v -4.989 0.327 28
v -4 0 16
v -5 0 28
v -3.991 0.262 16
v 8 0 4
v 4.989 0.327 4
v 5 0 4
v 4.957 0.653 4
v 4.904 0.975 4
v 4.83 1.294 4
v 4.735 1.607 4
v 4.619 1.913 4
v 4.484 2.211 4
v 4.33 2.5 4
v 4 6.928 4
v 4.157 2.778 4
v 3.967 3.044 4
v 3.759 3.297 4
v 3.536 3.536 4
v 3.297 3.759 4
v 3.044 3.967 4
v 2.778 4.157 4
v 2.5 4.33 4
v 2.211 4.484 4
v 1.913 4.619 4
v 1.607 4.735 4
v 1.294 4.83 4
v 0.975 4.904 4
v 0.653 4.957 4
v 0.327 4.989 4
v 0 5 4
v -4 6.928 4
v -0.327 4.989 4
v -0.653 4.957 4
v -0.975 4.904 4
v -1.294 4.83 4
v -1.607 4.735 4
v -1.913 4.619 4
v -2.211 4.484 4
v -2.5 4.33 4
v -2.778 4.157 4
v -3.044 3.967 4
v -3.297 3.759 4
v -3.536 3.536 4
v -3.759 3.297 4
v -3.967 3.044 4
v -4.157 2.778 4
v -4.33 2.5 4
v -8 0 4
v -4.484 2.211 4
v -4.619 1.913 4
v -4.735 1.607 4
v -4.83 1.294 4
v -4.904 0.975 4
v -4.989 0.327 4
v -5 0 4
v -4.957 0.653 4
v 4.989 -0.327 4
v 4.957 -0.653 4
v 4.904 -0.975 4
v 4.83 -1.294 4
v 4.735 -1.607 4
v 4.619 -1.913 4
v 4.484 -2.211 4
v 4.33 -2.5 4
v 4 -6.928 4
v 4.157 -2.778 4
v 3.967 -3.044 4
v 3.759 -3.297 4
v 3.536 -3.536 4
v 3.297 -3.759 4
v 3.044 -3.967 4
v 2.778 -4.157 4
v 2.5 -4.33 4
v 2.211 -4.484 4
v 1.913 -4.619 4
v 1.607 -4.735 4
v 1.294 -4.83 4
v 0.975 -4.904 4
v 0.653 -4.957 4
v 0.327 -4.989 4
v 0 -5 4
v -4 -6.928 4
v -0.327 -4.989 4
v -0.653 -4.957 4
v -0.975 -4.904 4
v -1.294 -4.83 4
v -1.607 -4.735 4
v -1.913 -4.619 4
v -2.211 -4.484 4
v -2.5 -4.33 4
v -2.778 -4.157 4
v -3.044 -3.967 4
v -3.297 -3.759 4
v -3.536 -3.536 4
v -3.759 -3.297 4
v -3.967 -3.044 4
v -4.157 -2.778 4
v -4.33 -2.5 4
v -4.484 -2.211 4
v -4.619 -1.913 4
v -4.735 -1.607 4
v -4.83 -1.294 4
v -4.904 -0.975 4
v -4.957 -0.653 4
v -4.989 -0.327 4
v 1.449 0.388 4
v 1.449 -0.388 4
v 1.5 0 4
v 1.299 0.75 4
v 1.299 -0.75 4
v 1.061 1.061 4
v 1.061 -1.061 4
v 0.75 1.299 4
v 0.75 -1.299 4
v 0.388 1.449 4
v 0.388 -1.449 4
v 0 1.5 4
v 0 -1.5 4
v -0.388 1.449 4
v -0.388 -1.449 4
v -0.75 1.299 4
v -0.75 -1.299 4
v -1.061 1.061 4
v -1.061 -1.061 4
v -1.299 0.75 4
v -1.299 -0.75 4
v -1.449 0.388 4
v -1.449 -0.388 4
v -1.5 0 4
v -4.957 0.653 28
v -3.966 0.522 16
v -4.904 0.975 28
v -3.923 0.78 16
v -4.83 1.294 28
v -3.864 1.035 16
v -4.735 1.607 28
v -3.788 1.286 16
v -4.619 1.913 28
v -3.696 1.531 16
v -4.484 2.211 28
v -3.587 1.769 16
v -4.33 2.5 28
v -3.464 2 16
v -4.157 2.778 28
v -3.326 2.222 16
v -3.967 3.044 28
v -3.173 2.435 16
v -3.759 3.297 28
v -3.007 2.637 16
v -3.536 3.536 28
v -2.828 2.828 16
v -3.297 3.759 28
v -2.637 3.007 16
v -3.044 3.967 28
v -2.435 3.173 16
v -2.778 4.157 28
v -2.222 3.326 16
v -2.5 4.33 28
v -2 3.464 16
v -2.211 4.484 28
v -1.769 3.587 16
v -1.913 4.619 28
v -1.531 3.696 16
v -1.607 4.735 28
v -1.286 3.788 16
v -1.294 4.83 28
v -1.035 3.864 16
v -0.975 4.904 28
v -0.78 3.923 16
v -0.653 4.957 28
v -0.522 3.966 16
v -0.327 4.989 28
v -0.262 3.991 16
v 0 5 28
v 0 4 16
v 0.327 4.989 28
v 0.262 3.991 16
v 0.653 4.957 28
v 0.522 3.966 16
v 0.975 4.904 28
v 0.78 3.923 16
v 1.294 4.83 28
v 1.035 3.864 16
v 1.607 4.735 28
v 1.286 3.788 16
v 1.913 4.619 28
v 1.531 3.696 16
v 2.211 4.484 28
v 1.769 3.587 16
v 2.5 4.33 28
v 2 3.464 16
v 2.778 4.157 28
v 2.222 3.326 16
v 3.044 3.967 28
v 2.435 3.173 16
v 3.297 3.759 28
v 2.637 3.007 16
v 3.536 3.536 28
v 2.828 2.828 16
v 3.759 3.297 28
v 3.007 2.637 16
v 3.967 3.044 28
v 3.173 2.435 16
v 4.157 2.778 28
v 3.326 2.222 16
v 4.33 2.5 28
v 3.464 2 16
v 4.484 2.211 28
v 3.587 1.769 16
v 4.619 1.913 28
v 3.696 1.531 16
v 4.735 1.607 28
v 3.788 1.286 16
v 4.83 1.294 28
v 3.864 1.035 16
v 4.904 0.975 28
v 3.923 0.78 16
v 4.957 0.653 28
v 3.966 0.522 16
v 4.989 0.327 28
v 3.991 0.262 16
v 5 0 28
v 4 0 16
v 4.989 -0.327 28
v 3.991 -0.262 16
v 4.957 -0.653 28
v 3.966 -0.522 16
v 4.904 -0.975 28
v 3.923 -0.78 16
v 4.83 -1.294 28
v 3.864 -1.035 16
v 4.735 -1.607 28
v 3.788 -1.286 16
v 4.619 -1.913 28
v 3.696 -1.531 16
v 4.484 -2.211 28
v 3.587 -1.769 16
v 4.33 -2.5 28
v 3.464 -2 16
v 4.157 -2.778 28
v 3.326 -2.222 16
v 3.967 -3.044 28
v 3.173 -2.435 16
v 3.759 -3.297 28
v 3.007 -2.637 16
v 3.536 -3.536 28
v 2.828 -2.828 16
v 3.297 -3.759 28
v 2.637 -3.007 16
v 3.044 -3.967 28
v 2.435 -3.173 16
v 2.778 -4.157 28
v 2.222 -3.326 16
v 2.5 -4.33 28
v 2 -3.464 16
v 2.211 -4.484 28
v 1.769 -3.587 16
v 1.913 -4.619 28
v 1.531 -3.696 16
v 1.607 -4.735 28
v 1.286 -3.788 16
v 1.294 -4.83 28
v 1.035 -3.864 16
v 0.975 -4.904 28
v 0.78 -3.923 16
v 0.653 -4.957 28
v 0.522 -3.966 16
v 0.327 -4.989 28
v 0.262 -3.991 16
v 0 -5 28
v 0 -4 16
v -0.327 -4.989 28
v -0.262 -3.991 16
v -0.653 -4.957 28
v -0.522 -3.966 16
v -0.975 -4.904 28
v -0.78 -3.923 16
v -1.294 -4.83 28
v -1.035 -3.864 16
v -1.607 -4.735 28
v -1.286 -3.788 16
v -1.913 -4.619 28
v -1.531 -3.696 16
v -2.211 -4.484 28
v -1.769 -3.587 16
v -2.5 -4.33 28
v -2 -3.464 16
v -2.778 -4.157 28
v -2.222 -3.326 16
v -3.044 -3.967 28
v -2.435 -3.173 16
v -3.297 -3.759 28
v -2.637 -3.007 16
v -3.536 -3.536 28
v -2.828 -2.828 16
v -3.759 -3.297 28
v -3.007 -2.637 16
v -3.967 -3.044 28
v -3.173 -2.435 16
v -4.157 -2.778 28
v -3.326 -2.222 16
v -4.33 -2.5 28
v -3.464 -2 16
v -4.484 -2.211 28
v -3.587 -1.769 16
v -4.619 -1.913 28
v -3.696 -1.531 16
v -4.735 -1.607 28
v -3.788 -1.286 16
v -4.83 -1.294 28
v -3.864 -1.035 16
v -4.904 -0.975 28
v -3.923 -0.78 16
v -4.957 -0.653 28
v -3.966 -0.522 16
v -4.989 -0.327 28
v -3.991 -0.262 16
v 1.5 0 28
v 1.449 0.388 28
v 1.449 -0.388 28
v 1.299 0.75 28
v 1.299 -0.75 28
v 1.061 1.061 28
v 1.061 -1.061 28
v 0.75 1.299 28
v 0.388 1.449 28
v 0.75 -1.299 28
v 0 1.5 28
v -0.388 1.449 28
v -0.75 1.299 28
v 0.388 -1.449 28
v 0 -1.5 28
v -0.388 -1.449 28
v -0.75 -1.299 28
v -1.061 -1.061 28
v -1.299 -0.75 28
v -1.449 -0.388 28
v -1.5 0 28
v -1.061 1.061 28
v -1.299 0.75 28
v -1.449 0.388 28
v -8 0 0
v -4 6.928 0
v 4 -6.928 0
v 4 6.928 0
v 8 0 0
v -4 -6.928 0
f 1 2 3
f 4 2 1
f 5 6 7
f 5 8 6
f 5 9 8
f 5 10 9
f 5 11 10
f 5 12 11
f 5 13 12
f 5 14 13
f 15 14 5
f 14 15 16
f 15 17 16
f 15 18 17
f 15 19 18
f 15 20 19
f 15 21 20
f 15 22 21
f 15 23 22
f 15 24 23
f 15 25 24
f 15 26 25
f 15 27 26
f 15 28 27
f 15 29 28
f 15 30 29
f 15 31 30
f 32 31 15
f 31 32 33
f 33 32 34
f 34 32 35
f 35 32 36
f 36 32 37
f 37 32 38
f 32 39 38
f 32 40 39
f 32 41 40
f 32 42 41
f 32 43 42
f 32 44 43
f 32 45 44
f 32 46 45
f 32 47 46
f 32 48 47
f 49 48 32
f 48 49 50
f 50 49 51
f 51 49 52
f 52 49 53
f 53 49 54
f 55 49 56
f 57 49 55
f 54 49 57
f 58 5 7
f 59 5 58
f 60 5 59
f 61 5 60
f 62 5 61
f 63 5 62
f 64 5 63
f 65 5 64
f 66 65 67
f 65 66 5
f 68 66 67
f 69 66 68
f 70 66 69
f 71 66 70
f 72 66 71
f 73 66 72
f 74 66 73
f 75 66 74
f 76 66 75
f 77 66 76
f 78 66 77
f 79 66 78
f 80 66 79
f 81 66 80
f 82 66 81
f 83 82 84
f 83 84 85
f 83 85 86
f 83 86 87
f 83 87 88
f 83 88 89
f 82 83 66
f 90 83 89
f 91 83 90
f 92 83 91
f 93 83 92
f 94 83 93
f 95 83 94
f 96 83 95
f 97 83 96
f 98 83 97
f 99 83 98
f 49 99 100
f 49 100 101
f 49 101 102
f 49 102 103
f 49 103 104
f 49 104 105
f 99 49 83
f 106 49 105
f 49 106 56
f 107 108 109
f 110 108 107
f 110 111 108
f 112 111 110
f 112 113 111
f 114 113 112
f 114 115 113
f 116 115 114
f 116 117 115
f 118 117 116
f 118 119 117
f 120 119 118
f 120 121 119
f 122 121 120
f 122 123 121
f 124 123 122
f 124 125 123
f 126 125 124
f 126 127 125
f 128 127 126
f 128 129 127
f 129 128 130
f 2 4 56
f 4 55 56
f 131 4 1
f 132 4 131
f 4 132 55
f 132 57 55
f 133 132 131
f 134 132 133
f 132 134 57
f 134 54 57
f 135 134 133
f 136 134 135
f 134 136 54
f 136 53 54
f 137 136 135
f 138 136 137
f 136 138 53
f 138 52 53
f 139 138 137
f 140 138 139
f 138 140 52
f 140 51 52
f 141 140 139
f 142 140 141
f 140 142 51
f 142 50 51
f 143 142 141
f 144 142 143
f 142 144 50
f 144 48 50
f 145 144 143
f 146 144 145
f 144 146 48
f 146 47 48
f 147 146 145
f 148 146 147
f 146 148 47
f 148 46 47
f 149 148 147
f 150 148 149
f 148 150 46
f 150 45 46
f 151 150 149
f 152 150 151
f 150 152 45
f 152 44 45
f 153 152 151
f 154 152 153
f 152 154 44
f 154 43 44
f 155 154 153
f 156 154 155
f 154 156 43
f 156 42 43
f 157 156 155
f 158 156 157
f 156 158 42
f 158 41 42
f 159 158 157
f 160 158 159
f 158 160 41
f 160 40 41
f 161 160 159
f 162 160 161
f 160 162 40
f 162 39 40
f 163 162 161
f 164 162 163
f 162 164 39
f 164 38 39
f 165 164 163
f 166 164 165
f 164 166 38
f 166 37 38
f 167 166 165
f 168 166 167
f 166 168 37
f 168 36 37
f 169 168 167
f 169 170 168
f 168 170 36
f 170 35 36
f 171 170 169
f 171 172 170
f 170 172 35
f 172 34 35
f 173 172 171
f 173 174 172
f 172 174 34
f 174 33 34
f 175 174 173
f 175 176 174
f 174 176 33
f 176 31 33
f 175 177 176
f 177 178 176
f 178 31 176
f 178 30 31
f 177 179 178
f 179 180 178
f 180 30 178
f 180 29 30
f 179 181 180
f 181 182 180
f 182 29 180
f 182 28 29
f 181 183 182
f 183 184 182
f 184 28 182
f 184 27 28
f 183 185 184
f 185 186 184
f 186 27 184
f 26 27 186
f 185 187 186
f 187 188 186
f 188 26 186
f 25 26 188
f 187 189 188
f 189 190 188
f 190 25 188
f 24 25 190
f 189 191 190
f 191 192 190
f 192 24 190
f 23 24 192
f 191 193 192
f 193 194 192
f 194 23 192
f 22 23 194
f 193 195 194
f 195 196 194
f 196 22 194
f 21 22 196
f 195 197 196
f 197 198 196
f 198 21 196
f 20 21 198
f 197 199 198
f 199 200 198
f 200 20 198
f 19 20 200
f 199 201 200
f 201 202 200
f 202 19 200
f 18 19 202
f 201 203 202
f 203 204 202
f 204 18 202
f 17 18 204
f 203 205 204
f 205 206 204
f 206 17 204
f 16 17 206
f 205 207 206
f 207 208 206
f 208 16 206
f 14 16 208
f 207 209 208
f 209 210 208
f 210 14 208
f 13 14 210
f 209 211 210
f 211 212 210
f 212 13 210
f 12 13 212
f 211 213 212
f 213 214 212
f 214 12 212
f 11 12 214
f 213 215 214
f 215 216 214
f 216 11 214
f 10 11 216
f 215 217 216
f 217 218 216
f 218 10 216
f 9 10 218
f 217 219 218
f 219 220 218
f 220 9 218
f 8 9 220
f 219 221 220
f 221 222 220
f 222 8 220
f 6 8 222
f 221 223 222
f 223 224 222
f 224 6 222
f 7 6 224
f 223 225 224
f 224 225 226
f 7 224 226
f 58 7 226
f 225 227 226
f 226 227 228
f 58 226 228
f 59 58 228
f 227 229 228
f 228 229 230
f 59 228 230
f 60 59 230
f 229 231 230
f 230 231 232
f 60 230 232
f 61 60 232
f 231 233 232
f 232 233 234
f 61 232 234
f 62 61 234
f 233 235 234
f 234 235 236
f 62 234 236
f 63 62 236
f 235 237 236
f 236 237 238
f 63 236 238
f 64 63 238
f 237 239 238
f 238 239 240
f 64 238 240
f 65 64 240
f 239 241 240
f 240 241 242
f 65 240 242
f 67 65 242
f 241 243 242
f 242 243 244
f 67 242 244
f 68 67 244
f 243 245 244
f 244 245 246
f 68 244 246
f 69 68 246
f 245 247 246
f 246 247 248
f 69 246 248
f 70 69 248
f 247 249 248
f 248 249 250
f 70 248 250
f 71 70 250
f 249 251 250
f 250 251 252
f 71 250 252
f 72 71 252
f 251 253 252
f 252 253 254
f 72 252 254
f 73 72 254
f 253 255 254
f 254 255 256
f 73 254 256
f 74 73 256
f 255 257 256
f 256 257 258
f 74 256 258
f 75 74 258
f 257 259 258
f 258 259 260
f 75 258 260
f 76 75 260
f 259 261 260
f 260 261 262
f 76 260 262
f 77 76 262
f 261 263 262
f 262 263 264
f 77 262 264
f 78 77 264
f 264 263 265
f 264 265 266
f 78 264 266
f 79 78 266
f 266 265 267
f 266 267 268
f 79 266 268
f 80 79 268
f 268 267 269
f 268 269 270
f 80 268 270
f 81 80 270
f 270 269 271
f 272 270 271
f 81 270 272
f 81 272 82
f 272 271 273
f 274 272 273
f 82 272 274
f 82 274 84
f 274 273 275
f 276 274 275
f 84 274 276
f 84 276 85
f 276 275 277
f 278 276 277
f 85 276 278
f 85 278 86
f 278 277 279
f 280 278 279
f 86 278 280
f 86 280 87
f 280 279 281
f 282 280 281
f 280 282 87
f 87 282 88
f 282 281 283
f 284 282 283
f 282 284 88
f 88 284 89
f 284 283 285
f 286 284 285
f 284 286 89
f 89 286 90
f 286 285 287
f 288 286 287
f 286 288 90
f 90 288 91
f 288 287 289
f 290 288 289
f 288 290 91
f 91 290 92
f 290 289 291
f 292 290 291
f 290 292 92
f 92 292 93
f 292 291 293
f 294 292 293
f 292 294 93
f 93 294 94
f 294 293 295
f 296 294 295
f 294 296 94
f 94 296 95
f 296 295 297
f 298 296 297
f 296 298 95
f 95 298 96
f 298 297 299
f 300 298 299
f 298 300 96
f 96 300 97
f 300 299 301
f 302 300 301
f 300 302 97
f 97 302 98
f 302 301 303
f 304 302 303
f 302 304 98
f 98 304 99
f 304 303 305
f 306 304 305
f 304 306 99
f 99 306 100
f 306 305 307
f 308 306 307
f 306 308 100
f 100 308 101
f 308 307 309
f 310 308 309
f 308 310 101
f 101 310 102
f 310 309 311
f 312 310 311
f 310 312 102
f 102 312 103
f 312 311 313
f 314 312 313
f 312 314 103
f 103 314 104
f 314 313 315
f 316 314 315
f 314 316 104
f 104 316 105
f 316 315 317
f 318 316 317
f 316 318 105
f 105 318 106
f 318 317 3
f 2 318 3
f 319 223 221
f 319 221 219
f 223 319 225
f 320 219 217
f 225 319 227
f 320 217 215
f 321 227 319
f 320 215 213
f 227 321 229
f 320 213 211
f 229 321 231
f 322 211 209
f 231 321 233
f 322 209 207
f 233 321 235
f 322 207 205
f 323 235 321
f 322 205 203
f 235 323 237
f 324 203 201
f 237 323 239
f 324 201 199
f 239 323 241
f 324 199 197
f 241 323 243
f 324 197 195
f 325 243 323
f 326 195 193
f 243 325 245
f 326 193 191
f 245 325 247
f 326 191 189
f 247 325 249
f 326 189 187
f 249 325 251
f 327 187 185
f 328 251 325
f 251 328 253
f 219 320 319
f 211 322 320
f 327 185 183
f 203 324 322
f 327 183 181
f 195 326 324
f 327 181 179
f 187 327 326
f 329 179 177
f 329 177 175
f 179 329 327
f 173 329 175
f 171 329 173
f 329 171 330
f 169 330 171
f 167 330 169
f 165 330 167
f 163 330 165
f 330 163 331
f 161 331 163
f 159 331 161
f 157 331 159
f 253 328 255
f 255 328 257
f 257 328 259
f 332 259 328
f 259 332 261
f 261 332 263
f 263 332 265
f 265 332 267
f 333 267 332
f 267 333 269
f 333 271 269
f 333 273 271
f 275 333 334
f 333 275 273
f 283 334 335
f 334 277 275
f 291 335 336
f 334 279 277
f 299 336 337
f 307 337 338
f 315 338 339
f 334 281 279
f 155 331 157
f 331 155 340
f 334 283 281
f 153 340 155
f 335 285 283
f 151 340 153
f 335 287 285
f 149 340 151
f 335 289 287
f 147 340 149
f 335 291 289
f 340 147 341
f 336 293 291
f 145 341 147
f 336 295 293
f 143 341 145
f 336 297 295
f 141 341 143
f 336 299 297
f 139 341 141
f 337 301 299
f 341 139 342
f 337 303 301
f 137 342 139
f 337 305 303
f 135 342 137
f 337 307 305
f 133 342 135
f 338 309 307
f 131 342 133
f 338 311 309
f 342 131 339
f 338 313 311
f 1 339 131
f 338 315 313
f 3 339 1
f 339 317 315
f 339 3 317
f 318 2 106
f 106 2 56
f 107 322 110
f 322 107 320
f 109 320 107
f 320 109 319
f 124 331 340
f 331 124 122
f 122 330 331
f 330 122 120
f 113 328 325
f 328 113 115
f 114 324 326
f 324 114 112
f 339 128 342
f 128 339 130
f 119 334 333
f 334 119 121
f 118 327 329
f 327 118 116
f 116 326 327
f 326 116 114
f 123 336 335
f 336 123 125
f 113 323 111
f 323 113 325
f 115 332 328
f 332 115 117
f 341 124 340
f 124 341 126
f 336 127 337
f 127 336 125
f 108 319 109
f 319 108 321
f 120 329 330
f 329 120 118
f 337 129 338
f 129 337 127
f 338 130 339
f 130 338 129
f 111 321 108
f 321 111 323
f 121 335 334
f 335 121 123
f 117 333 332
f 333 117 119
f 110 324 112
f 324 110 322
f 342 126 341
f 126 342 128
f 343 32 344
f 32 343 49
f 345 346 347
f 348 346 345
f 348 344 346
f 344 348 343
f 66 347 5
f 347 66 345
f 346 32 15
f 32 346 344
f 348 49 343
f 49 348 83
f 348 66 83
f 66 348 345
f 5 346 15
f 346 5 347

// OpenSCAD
// Real part: a threaded-look standoff post built as a rotate_extrude of a
// serrated profile, on a hex base.
// Constructs: rotate_extrude, polygon, difference, union, for-loop, cylinder, linear_extrude, circle.
post_h = 24;
core_r = 4;
teeth = 24;

module thread_body() {
    // A saw-tooth radial profile swept around Z approximates a thread ridge.
    rotate_extrude($fn = 96)
        polygon(points = [
            [0, 0],
            [core_r + 1, 0],
            [core_r, post_h * 0.5],
            [core_r + 1, post_h],
            [0, post_h]
        ]);
}

union() {
    // Hex base.
    linear_extrude(height = 4) circle(r = 8, $fn = 6);
    translate([0, 0, 4]) difference() {
        thread_body();
        // Axial pilot hole.
        translate([0, 0, -1]) cylinder(h = post_h + 2, r = 1.5, $fn = 24);
    }
}
